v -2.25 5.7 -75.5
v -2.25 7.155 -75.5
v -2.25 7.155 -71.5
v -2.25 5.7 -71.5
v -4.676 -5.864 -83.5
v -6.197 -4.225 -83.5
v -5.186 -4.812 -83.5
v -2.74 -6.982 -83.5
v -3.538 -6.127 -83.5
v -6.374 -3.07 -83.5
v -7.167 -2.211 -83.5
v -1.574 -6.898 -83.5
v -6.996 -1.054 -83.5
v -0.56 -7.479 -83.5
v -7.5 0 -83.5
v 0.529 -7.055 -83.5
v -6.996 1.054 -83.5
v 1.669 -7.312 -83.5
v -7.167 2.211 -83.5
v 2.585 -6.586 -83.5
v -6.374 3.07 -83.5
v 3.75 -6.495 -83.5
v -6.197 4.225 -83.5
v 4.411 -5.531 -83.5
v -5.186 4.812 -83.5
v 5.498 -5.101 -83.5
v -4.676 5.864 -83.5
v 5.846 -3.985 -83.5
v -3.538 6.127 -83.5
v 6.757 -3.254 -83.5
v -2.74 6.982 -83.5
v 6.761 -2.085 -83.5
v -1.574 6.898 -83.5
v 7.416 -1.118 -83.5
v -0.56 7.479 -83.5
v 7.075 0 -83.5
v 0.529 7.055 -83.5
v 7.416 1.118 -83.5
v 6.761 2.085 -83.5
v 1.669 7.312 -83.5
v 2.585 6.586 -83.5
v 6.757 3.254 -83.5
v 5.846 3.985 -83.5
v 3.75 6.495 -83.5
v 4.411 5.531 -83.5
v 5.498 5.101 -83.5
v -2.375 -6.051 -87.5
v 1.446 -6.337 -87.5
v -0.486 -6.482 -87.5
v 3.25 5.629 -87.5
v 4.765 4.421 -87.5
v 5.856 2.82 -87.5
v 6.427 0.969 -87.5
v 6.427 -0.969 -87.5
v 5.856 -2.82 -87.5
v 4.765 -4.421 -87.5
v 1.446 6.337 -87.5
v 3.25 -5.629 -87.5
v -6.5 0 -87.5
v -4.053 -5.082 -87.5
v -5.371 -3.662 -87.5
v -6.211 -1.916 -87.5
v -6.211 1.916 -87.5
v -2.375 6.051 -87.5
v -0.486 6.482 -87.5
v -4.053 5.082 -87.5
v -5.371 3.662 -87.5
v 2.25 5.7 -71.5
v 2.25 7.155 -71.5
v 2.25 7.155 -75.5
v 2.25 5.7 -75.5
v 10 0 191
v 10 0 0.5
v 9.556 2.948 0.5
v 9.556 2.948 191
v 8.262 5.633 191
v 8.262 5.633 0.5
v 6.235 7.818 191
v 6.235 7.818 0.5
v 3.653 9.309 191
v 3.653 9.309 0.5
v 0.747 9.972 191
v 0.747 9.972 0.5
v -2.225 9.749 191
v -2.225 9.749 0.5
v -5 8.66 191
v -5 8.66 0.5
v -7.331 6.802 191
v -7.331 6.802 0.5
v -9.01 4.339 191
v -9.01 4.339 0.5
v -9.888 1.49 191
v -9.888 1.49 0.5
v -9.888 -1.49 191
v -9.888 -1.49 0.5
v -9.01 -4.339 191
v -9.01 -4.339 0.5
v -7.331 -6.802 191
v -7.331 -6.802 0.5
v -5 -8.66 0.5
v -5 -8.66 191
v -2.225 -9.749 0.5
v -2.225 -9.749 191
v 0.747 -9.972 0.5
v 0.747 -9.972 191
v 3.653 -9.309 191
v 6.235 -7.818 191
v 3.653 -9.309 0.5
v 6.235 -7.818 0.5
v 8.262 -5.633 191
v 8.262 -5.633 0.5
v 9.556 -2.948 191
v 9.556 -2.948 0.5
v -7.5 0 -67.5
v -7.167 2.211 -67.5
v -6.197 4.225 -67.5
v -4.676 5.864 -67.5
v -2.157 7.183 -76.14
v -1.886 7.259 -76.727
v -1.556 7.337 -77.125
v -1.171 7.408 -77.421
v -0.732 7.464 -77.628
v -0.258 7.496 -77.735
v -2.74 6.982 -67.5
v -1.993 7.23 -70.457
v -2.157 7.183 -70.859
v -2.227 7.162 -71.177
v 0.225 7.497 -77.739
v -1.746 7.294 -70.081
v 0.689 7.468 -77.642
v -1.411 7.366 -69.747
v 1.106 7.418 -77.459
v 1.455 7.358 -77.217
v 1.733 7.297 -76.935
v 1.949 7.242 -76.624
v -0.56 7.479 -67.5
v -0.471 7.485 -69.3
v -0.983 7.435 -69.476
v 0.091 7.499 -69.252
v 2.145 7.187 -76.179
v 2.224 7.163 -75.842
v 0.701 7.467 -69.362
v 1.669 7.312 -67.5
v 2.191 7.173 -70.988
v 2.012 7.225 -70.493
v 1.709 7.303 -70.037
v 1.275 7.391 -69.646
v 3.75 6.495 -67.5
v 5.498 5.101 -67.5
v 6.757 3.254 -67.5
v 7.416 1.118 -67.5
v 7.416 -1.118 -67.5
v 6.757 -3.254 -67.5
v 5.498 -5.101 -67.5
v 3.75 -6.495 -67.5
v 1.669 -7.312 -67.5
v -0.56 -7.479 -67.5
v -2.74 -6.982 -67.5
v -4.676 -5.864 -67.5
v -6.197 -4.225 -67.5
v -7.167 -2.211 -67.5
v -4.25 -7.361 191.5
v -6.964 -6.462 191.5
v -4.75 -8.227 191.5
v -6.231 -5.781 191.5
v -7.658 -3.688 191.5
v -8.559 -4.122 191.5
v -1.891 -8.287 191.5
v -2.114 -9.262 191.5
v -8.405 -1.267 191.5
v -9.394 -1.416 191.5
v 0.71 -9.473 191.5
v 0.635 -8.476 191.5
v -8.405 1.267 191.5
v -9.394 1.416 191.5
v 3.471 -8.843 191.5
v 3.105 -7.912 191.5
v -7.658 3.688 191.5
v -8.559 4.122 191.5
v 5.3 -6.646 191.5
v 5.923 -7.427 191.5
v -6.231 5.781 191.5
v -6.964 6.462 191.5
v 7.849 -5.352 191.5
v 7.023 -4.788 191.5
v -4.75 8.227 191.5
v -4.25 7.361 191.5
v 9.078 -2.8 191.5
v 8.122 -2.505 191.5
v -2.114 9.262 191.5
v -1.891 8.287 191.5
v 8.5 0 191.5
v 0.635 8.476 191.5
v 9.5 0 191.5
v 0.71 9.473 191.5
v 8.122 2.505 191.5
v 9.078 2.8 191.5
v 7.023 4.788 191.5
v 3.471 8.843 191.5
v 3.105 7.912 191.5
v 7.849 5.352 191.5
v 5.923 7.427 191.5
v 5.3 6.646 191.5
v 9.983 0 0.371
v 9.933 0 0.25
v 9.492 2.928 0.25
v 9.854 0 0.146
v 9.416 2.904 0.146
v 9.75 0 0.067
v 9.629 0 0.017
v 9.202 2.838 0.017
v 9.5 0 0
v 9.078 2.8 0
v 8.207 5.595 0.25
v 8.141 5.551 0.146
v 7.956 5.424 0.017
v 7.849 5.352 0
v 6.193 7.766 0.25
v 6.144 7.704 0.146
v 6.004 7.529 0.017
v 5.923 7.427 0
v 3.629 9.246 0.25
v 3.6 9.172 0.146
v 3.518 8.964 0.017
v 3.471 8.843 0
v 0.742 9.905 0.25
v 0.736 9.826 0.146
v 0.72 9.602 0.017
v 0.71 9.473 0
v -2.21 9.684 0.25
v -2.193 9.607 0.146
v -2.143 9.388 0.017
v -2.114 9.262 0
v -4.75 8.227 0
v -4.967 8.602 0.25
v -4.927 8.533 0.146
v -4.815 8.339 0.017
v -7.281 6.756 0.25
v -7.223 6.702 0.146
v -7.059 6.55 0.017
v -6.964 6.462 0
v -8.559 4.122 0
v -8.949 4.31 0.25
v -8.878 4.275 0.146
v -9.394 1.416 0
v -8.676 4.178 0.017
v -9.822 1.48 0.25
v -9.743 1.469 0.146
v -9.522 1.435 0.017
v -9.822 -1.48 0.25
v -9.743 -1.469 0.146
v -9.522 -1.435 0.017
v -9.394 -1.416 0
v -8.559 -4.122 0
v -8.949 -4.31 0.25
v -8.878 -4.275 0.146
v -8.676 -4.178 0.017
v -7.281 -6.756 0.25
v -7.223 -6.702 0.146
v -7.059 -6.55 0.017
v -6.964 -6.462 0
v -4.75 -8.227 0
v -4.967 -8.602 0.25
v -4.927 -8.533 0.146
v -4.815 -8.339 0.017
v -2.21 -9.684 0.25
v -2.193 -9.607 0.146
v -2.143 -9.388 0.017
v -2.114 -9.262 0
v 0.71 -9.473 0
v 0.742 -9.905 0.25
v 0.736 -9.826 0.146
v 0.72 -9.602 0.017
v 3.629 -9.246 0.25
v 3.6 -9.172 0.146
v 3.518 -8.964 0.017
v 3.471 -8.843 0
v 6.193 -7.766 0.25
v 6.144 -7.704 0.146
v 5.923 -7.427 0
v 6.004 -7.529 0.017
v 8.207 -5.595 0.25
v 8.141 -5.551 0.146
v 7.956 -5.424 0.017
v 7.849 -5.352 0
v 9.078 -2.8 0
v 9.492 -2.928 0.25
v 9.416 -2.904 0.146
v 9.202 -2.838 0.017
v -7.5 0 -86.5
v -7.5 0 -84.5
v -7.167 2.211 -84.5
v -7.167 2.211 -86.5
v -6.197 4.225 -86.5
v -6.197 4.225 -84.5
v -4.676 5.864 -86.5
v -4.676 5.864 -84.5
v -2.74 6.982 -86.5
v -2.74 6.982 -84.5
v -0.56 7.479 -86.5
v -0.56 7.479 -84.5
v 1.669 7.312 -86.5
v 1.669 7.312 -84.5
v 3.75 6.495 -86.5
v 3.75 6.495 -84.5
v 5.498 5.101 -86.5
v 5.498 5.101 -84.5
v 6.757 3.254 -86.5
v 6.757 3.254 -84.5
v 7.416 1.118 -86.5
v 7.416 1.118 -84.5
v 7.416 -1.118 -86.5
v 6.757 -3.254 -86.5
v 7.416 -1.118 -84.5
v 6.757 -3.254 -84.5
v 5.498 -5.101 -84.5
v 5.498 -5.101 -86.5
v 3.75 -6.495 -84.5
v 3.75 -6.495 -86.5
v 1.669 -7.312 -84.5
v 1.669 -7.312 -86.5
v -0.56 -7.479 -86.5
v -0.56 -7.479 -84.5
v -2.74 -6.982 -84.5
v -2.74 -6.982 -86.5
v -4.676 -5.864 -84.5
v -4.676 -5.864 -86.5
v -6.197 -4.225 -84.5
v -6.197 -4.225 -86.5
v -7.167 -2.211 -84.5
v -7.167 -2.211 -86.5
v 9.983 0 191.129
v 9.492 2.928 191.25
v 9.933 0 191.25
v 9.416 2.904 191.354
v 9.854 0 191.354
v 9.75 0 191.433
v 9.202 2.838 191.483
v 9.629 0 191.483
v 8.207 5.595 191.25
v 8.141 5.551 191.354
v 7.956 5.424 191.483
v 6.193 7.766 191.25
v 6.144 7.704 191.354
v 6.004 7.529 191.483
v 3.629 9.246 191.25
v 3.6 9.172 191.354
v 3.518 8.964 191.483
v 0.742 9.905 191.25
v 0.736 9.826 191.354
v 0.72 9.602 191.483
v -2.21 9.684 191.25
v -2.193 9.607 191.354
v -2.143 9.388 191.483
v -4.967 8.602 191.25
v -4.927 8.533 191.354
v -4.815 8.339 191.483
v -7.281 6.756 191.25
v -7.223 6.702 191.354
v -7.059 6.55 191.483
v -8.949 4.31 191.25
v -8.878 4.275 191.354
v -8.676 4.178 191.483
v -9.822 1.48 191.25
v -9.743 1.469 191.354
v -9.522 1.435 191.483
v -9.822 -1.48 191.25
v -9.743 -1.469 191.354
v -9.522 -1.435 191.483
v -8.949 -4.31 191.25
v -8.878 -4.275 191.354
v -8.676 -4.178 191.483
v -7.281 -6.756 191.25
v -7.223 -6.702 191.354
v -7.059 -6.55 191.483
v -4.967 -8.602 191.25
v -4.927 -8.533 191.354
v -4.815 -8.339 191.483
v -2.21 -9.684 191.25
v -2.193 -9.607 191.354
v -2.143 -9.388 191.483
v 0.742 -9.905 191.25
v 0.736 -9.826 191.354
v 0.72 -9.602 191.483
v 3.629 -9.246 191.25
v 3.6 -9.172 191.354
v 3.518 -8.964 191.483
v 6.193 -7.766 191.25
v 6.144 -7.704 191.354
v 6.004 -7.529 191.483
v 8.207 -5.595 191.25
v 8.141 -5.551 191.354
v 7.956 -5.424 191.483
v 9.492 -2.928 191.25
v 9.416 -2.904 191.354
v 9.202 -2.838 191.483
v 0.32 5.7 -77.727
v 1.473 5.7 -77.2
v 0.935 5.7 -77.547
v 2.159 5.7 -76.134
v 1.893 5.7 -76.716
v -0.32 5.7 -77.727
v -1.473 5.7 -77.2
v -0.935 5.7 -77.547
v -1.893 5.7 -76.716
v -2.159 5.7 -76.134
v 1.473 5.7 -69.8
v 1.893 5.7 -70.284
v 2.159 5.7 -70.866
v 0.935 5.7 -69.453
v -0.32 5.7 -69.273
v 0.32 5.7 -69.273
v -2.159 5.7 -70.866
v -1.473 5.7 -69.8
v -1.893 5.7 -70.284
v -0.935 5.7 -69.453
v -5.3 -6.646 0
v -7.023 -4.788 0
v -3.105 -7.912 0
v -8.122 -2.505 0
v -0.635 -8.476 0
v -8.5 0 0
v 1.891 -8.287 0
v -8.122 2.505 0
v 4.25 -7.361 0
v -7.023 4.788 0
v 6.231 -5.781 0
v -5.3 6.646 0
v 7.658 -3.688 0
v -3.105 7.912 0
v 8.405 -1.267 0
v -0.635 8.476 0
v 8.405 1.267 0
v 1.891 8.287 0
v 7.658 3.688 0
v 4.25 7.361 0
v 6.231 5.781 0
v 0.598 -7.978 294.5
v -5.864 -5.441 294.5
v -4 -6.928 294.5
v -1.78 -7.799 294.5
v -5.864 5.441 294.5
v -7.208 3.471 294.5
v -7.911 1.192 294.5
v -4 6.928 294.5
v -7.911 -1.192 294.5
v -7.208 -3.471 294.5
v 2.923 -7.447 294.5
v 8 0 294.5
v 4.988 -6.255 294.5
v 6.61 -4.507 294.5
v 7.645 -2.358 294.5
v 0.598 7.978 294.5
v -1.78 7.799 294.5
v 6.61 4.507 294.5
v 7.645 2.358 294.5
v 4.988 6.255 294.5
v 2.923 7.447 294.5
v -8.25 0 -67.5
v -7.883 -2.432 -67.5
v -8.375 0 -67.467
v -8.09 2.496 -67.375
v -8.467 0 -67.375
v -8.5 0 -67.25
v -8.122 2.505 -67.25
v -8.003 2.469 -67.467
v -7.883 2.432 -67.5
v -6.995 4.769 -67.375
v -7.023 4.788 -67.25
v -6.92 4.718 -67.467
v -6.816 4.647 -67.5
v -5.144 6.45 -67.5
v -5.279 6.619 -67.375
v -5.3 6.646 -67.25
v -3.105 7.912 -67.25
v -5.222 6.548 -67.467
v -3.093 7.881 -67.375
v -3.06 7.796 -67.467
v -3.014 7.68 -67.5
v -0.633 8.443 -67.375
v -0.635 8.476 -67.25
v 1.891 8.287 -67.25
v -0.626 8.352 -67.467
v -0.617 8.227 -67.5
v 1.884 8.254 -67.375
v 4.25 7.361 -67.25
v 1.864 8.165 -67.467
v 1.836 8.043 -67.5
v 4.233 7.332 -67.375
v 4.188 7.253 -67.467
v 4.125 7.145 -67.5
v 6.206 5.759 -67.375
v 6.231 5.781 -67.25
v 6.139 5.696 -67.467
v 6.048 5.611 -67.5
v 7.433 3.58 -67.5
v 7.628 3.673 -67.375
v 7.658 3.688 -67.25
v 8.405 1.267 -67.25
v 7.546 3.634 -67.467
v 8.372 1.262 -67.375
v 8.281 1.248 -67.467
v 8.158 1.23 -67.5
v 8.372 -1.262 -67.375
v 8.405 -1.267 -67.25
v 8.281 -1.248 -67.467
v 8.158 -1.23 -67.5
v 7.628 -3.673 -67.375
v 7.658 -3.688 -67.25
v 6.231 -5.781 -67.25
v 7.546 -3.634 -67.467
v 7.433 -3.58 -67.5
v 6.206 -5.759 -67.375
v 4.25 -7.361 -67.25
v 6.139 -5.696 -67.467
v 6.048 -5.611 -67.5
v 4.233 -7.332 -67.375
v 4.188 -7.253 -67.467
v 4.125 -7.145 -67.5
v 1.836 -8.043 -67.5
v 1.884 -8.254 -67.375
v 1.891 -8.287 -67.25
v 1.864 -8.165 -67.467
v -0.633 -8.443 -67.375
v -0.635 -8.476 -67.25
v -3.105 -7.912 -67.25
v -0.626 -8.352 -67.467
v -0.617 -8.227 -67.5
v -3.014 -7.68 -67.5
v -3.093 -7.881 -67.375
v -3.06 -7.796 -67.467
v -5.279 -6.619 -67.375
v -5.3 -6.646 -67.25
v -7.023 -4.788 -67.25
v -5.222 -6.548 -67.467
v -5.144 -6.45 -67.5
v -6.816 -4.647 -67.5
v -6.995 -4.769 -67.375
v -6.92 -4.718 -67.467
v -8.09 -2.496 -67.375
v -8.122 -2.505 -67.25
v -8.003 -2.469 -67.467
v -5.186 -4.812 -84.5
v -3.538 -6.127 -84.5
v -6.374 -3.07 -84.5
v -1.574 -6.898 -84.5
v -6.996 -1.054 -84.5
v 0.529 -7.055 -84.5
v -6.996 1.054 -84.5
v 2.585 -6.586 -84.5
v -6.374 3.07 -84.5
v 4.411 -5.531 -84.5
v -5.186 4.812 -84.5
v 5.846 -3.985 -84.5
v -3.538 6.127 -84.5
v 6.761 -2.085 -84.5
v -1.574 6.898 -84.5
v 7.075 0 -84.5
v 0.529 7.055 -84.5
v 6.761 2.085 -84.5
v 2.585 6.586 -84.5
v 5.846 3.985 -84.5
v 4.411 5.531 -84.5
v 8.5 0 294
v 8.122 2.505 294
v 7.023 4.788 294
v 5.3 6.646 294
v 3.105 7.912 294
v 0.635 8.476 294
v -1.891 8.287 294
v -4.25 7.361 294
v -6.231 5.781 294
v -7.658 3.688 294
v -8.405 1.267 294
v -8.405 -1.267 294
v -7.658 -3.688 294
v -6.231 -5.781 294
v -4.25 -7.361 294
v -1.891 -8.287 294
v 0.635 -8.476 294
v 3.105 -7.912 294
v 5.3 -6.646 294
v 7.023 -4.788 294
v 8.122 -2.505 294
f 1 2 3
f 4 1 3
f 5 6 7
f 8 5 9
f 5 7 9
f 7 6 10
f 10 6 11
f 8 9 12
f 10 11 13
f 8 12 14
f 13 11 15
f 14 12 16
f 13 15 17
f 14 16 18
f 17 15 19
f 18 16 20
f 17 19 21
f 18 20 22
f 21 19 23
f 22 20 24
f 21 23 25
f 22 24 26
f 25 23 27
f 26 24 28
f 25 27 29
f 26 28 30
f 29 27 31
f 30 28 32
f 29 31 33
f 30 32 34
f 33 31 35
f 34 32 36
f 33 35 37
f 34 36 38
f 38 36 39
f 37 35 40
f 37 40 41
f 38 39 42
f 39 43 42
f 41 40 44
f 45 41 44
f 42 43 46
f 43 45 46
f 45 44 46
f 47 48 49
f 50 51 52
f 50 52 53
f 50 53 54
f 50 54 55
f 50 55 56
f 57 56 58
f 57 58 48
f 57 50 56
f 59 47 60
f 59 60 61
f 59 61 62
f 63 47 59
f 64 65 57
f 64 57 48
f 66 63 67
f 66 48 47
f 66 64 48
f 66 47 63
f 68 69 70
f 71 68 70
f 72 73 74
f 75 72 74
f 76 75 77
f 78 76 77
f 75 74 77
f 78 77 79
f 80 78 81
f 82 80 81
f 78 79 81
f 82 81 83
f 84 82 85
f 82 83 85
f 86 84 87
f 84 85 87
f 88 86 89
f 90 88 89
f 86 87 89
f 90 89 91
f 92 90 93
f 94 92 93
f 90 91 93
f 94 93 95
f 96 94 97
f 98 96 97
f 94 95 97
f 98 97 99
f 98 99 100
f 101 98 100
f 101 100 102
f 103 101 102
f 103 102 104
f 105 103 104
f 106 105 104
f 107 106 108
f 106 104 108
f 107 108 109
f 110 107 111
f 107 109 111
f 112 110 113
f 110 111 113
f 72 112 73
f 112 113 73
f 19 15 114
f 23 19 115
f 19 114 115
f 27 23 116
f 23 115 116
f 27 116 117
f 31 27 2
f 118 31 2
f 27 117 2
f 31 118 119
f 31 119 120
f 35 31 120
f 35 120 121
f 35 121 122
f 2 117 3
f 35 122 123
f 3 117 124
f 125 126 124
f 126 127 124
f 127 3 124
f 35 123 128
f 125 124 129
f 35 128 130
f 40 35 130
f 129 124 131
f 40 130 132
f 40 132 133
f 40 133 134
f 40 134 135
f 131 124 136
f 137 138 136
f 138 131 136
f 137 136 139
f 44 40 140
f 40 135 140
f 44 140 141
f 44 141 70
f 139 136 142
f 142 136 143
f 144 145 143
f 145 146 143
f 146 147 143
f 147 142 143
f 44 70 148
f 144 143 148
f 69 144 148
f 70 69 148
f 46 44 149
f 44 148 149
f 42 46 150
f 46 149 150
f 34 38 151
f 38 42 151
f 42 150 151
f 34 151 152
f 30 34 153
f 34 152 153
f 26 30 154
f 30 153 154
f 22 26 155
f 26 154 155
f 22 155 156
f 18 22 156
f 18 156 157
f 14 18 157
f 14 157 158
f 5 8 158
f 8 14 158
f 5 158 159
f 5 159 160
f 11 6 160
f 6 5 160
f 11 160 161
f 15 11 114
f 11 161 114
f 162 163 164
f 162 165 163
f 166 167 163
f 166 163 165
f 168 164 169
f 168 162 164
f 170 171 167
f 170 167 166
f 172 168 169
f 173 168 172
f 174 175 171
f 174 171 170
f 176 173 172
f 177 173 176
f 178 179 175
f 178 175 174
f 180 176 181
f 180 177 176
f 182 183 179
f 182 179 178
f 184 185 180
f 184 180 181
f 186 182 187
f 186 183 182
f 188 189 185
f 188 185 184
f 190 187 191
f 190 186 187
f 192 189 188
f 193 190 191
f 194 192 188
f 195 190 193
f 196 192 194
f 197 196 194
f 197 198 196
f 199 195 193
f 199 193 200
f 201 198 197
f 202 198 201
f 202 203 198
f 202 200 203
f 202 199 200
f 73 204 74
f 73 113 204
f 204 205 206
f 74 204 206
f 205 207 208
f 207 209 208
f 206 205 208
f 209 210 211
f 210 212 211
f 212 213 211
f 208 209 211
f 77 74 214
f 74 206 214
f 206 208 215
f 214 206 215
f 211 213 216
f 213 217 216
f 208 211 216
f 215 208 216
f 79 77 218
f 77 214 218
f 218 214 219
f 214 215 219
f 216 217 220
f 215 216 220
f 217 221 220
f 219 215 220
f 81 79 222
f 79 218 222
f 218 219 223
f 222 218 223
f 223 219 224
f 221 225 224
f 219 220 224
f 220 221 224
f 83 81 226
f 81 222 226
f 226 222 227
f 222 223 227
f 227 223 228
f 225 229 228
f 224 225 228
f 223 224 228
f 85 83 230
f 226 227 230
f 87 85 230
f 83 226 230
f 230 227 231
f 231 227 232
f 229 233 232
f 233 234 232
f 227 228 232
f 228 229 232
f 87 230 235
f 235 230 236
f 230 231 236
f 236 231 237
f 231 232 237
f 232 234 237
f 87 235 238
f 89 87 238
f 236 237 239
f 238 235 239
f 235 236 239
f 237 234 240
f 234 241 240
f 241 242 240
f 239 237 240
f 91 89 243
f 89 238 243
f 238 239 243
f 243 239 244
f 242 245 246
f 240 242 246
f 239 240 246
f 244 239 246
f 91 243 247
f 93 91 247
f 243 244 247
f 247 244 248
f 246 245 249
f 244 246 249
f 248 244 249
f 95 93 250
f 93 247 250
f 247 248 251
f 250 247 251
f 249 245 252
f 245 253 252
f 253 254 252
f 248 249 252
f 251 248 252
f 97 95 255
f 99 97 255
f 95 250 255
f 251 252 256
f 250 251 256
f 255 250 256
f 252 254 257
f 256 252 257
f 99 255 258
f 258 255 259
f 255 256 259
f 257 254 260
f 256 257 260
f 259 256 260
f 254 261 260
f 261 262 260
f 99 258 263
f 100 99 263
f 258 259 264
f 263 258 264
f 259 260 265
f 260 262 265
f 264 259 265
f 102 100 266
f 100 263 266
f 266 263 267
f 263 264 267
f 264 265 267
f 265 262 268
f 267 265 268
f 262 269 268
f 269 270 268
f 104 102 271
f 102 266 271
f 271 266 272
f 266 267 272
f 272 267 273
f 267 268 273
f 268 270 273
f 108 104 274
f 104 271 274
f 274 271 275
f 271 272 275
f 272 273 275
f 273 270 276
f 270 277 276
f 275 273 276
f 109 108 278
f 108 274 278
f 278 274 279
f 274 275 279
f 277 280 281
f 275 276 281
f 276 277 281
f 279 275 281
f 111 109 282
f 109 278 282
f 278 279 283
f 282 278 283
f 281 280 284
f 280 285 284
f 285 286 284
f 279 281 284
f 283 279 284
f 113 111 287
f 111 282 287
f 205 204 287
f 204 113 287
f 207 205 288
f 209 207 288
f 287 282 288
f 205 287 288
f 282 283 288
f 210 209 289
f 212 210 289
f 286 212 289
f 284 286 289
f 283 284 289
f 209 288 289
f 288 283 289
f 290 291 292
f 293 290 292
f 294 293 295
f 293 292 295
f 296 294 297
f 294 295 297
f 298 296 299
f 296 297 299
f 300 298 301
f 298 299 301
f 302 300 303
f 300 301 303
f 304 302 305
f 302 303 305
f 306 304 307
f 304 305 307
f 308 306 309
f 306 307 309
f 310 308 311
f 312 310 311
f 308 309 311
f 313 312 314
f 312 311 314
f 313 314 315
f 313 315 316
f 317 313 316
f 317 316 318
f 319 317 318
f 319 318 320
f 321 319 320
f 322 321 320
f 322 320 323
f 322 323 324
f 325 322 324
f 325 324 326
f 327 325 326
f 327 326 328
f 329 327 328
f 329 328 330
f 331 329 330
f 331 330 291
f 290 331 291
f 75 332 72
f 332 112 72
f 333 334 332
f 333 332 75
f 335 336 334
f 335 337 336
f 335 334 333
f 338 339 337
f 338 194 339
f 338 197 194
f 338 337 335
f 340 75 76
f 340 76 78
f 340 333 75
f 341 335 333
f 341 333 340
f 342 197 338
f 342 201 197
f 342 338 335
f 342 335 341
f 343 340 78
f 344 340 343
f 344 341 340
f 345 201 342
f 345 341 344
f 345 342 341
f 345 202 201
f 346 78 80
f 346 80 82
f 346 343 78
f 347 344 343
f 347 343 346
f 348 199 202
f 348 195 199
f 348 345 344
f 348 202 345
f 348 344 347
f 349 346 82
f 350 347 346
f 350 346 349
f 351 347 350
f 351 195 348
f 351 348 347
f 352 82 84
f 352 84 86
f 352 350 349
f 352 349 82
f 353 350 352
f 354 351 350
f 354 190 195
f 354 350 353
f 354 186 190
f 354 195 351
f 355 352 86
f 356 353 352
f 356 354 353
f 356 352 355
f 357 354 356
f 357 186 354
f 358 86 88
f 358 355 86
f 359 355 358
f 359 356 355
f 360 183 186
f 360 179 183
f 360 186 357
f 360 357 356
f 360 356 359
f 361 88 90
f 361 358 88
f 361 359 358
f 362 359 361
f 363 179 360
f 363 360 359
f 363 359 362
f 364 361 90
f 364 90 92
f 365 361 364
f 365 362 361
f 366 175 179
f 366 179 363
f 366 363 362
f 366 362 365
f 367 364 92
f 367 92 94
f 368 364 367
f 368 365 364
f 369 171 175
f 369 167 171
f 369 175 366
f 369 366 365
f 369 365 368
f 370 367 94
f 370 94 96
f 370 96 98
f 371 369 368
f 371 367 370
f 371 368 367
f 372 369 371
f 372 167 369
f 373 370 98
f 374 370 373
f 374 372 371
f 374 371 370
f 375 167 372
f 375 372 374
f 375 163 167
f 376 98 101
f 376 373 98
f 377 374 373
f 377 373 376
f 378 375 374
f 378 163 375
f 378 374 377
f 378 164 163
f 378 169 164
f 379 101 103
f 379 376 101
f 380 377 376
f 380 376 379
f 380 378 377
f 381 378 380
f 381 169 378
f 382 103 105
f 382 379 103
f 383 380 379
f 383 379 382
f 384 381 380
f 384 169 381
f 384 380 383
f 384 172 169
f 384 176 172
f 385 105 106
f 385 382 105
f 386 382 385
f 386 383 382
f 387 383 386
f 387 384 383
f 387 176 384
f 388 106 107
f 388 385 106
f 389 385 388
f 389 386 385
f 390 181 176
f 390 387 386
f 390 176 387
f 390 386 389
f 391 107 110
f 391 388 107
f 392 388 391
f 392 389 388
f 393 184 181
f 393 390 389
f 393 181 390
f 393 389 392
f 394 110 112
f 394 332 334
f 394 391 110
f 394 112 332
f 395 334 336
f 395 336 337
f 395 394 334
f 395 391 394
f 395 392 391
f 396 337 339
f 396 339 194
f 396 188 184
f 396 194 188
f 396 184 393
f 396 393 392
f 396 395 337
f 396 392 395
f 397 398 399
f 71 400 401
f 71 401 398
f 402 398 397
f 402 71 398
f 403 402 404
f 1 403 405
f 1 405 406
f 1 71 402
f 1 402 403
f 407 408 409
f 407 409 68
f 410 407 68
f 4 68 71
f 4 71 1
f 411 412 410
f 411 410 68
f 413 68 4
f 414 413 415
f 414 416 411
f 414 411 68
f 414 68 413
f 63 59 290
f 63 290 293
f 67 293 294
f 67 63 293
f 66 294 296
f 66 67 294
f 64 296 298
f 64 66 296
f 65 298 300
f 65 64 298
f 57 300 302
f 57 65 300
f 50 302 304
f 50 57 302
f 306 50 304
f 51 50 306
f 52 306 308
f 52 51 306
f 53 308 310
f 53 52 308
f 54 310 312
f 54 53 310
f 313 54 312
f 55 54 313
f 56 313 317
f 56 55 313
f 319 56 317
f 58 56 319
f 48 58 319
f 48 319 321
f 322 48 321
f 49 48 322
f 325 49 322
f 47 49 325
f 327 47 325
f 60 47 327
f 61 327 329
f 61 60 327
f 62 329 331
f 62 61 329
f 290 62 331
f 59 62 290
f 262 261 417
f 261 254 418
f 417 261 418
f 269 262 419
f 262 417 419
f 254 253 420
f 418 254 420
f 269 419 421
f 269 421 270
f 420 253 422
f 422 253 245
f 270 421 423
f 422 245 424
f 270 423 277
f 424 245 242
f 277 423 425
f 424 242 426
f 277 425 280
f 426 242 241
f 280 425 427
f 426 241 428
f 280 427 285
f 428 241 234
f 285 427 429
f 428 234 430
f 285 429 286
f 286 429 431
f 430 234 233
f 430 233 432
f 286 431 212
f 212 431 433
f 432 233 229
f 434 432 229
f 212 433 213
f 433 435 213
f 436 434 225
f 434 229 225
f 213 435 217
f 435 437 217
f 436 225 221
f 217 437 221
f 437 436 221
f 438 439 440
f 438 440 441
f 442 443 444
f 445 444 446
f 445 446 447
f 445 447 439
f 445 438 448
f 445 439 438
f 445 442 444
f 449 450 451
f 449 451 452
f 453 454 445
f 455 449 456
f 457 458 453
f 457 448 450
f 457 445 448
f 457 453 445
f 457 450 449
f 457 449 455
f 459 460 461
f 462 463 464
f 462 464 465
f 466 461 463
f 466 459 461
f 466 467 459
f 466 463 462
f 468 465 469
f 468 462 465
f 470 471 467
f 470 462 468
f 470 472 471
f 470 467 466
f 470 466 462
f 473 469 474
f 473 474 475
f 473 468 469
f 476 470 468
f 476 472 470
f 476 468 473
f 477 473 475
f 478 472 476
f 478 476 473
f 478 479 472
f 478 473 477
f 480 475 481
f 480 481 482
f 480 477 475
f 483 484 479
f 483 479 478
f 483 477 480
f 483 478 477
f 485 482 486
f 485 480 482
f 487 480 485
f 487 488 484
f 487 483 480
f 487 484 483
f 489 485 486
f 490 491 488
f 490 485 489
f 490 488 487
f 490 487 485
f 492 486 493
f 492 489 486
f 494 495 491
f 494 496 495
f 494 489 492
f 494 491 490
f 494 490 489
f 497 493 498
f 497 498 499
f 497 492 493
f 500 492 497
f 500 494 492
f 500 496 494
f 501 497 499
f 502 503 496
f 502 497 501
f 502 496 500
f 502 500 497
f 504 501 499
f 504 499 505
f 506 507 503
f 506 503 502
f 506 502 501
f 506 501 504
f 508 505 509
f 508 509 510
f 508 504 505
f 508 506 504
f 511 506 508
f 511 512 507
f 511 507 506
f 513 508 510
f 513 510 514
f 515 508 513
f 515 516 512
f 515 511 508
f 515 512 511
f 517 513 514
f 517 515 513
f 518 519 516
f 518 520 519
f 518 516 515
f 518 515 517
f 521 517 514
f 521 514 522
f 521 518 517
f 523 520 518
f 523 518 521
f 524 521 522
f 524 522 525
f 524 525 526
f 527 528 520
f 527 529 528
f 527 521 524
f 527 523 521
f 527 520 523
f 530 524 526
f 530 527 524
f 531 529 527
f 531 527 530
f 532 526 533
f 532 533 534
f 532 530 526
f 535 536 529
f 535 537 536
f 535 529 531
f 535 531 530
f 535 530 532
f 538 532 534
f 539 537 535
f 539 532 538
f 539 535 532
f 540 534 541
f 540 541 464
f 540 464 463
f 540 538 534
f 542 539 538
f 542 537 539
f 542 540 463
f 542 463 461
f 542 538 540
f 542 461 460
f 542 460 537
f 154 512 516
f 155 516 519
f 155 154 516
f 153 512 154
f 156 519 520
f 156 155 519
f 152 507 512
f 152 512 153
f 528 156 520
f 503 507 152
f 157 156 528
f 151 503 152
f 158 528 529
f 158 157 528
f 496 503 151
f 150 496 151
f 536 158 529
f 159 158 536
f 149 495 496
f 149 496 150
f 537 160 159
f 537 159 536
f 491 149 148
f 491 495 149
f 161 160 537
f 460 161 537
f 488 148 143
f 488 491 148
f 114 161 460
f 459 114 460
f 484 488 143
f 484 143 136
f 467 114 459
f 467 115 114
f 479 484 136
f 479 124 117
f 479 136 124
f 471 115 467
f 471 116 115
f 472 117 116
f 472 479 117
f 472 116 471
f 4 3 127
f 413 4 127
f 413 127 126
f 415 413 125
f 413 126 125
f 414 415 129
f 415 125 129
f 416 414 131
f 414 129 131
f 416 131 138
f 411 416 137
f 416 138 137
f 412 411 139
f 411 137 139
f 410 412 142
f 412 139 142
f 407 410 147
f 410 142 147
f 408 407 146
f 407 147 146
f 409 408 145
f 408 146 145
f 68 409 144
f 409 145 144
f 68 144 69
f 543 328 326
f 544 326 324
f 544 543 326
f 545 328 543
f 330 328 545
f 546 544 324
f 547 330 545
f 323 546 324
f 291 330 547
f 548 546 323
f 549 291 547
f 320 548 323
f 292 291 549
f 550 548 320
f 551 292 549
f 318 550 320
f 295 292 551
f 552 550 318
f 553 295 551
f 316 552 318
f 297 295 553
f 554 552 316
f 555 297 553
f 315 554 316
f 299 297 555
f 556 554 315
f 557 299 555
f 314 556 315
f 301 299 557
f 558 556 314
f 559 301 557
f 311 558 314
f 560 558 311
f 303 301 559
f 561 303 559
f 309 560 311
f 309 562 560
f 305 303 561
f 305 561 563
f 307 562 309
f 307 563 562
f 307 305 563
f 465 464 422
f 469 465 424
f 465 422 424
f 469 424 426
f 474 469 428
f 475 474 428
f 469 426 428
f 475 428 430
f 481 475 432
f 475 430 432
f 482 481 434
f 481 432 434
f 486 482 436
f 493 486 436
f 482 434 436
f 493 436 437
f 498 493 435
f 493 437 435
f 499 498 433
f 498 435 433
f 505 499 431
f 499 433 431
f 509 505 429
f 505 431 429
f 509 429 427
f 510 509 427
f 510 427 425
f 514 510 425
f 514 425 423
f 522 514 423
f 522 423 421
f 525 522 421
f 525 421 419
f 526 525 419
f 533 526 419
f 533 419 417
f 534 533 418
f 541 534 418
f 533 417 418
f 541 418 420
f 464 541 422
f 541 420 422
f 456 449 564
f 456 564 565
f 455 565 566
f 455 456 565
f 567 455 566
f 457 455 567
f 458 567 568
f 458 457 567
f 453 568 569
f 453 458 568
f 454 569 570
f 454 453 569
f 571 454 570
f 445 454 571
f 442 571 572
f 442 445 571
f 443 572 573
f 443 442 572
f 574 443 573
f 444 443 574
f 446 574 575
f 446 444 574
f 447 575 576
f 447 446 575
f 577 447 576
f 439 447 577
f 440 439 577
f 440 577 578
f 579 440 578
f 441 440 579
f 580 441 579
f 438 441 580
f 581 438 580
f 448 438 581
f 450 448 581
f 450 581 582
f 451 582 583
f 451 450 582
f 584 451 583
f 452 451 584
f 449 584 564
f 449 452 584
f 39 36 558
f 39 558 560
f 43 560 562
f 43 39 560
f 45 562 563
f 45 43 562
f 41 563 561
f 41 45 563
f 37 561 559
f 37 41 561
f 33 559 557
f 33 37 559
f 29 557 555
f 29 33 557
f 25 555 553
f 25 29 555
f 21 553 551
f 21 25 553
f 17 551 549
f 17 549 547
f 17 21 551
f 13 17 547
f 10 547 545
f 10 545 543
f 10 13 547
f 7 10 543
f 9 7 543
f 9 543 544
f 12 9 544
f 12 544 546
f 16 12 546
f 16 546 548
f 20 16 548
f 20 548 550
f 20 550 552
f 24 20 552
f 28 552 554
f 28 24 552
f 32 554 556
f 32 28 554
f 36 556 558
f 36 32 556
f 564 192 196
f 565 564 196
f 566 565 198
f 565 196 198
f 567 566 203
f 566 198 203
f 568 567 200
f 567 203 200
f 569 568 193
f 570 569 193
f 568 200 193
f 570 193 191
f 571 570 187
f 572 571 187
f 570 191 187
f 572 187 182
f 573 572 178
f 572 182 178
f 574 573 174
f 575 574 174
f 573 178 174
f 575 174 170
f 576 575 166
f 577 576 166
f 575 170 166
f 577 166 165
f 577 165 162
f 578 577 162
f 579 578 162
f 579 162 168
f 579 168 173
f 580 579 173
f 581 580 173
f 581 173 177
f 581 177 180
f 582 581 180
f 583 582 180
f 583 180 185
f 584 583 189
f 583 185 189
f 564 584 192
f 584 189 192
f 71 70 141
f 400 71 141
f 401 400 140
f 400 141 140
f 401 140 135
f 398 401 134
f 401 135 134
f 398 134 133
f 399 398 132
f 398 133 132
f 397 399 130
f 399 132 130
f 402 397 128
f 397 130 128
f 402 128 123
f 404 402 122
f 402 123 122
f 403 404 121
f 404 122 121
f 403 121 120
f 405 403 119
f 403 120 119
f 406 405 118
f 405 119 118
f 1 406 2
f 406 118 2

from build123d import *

# Parameters (mm, degrees)
SKETCH1_R               = 10
BOSS_EXTRUDE1_DEPTH     = 191.5
SKETCH2_R               = 8.5
BOSS_EXTRUDE2_DEPTH     = 103
SKETCH4_R               = 8.5
BOSS_EXTRUDE3_DEPTH     = 67.5
FILLET1_R               = 0.5
FILLET2_R               = 0.5
SKETCH6_R               = 7.5
BOSS_EXTRUDE4_DEPTH     = 20
CUT_EXTRUDE1_DEPTH      = 1.8
SKETCH8_R               = 17.075
SKETCH8_R_2             = 7.075
CUT_EXTRUDE_THIN1_DEPTH = 1
FILLET3_R               = 0.25
CHAMFER1_SIZE           = 1
CHAMFER2_SIZE           = 0.5


with BuildPart() as part:
    # Sketch1 → Boss-Extrude1 (new body)
    with BuildSketch(Plane.XY):
        Circle(SKETCH1_R)
    extrude(amount=BOSS_EXTRUDE1_DEPTH)

    # Sketch2 → Boss-Extrude2 (add)
    with BuildSketch(Plane.XY.offset(191.5)):
        Circle(SKETCH2_R)
    extrude(amount=BOSS_EXTRUDE2_DEPTH)

    # Sketch4 → Boss-Extrude3 (add)
    with BuildSketch(Plane(origin=(0, 0, 0), x_dir=(-1, 0, 0), z_dir=(0, 0, -1))):
        Circle(SKETCH4_R)
    extrude(amount=BOSS_EXTRUDE3_DEPTH)

    # Fillet1
    fillet1_edges = [part.edges().sort_by_distance(p)[0] for p in [
        (-10, 0, 191.5),
    ]]
    fillet(fillet1_edges, radius=FILLET1_R)

    # Fillet2
    fillet2_edges = [part.edges().sort_by_distance(p)[0] for p in [
        (-10, 0, 0),
    ]]
    fillet(fillet2_edges, radius=FILLET2_R)

    # Sketch6 → Boss-Extrude4 (add)
    with BuildSketch(Plane(origin=(0, 0, -67.5), x_dir=(-1, 0, 0), z_dir=(0, 0, -1))):
        Circle(SKETCH6_R)
    extrude(amount=BOSS_EXTRUDE4_DEPTH)

    # Sketch7 → Cut-Extrude1 (cut)
    with BuildSketch(Plane(origin=(0, 7.5, 0), x_dir=(-1, 0, 0), z_dir=(0, 1, 0))):
        with BuildLine():
            Line((2.25, -75.5), (2.25, -71.5))
            ThreePointArc((2.25, -71.5), (0, -69.25), (-2.25, -71.5))
            Line((-2.25, -71.5), (-2.25, -75.5))
            ThreePointArc((-2.25, -75.5), (0, -77.75), (2.25, -75.5))
        make_face()
    extrude(amount=-CUT_EXTRUDE1_DEPTH, mode=Mode.SUBTRACT)

    # Sketch8 → Cut-Extrude-Thin1 (cut)
    with BuildSketch(Plane.XY.offset(-83.5)):
        Circle(SKETCH8_R)
        Circle(SKETCH8_R_2, mode=Mode.SUBTRACT)
    extrude(amount=-CUT_EXTRUDE_THIN1_DEPTH, mode=Mode.SUBTRACT)

    # Fillet3
    fillet3_edges = [part.edges().sort_by_distance(p)[0] for p in [
        (8.5, 0, -67.5),
    ]]
    fillet(fillet3_edges, radius=FILLET3_R)

    # Chamfer1
    chamfer1_edges = [part.edges().sort_by_distance(p)[0] for p in [
        (7.5, 0, -87.5),
    ]]
    chamfer(chamfer1_edges, length=CHAMFER1_SIZE)

    # Chamfer2
    chamfer2_edges = [part.edges().sort_by_distance(p)[0] for p in [
        (-8.5, 0, 294.5),
    ]]
    chamfer(chamfer2_edges, length=CHAMFER2_SIZE)


solid = part.part
